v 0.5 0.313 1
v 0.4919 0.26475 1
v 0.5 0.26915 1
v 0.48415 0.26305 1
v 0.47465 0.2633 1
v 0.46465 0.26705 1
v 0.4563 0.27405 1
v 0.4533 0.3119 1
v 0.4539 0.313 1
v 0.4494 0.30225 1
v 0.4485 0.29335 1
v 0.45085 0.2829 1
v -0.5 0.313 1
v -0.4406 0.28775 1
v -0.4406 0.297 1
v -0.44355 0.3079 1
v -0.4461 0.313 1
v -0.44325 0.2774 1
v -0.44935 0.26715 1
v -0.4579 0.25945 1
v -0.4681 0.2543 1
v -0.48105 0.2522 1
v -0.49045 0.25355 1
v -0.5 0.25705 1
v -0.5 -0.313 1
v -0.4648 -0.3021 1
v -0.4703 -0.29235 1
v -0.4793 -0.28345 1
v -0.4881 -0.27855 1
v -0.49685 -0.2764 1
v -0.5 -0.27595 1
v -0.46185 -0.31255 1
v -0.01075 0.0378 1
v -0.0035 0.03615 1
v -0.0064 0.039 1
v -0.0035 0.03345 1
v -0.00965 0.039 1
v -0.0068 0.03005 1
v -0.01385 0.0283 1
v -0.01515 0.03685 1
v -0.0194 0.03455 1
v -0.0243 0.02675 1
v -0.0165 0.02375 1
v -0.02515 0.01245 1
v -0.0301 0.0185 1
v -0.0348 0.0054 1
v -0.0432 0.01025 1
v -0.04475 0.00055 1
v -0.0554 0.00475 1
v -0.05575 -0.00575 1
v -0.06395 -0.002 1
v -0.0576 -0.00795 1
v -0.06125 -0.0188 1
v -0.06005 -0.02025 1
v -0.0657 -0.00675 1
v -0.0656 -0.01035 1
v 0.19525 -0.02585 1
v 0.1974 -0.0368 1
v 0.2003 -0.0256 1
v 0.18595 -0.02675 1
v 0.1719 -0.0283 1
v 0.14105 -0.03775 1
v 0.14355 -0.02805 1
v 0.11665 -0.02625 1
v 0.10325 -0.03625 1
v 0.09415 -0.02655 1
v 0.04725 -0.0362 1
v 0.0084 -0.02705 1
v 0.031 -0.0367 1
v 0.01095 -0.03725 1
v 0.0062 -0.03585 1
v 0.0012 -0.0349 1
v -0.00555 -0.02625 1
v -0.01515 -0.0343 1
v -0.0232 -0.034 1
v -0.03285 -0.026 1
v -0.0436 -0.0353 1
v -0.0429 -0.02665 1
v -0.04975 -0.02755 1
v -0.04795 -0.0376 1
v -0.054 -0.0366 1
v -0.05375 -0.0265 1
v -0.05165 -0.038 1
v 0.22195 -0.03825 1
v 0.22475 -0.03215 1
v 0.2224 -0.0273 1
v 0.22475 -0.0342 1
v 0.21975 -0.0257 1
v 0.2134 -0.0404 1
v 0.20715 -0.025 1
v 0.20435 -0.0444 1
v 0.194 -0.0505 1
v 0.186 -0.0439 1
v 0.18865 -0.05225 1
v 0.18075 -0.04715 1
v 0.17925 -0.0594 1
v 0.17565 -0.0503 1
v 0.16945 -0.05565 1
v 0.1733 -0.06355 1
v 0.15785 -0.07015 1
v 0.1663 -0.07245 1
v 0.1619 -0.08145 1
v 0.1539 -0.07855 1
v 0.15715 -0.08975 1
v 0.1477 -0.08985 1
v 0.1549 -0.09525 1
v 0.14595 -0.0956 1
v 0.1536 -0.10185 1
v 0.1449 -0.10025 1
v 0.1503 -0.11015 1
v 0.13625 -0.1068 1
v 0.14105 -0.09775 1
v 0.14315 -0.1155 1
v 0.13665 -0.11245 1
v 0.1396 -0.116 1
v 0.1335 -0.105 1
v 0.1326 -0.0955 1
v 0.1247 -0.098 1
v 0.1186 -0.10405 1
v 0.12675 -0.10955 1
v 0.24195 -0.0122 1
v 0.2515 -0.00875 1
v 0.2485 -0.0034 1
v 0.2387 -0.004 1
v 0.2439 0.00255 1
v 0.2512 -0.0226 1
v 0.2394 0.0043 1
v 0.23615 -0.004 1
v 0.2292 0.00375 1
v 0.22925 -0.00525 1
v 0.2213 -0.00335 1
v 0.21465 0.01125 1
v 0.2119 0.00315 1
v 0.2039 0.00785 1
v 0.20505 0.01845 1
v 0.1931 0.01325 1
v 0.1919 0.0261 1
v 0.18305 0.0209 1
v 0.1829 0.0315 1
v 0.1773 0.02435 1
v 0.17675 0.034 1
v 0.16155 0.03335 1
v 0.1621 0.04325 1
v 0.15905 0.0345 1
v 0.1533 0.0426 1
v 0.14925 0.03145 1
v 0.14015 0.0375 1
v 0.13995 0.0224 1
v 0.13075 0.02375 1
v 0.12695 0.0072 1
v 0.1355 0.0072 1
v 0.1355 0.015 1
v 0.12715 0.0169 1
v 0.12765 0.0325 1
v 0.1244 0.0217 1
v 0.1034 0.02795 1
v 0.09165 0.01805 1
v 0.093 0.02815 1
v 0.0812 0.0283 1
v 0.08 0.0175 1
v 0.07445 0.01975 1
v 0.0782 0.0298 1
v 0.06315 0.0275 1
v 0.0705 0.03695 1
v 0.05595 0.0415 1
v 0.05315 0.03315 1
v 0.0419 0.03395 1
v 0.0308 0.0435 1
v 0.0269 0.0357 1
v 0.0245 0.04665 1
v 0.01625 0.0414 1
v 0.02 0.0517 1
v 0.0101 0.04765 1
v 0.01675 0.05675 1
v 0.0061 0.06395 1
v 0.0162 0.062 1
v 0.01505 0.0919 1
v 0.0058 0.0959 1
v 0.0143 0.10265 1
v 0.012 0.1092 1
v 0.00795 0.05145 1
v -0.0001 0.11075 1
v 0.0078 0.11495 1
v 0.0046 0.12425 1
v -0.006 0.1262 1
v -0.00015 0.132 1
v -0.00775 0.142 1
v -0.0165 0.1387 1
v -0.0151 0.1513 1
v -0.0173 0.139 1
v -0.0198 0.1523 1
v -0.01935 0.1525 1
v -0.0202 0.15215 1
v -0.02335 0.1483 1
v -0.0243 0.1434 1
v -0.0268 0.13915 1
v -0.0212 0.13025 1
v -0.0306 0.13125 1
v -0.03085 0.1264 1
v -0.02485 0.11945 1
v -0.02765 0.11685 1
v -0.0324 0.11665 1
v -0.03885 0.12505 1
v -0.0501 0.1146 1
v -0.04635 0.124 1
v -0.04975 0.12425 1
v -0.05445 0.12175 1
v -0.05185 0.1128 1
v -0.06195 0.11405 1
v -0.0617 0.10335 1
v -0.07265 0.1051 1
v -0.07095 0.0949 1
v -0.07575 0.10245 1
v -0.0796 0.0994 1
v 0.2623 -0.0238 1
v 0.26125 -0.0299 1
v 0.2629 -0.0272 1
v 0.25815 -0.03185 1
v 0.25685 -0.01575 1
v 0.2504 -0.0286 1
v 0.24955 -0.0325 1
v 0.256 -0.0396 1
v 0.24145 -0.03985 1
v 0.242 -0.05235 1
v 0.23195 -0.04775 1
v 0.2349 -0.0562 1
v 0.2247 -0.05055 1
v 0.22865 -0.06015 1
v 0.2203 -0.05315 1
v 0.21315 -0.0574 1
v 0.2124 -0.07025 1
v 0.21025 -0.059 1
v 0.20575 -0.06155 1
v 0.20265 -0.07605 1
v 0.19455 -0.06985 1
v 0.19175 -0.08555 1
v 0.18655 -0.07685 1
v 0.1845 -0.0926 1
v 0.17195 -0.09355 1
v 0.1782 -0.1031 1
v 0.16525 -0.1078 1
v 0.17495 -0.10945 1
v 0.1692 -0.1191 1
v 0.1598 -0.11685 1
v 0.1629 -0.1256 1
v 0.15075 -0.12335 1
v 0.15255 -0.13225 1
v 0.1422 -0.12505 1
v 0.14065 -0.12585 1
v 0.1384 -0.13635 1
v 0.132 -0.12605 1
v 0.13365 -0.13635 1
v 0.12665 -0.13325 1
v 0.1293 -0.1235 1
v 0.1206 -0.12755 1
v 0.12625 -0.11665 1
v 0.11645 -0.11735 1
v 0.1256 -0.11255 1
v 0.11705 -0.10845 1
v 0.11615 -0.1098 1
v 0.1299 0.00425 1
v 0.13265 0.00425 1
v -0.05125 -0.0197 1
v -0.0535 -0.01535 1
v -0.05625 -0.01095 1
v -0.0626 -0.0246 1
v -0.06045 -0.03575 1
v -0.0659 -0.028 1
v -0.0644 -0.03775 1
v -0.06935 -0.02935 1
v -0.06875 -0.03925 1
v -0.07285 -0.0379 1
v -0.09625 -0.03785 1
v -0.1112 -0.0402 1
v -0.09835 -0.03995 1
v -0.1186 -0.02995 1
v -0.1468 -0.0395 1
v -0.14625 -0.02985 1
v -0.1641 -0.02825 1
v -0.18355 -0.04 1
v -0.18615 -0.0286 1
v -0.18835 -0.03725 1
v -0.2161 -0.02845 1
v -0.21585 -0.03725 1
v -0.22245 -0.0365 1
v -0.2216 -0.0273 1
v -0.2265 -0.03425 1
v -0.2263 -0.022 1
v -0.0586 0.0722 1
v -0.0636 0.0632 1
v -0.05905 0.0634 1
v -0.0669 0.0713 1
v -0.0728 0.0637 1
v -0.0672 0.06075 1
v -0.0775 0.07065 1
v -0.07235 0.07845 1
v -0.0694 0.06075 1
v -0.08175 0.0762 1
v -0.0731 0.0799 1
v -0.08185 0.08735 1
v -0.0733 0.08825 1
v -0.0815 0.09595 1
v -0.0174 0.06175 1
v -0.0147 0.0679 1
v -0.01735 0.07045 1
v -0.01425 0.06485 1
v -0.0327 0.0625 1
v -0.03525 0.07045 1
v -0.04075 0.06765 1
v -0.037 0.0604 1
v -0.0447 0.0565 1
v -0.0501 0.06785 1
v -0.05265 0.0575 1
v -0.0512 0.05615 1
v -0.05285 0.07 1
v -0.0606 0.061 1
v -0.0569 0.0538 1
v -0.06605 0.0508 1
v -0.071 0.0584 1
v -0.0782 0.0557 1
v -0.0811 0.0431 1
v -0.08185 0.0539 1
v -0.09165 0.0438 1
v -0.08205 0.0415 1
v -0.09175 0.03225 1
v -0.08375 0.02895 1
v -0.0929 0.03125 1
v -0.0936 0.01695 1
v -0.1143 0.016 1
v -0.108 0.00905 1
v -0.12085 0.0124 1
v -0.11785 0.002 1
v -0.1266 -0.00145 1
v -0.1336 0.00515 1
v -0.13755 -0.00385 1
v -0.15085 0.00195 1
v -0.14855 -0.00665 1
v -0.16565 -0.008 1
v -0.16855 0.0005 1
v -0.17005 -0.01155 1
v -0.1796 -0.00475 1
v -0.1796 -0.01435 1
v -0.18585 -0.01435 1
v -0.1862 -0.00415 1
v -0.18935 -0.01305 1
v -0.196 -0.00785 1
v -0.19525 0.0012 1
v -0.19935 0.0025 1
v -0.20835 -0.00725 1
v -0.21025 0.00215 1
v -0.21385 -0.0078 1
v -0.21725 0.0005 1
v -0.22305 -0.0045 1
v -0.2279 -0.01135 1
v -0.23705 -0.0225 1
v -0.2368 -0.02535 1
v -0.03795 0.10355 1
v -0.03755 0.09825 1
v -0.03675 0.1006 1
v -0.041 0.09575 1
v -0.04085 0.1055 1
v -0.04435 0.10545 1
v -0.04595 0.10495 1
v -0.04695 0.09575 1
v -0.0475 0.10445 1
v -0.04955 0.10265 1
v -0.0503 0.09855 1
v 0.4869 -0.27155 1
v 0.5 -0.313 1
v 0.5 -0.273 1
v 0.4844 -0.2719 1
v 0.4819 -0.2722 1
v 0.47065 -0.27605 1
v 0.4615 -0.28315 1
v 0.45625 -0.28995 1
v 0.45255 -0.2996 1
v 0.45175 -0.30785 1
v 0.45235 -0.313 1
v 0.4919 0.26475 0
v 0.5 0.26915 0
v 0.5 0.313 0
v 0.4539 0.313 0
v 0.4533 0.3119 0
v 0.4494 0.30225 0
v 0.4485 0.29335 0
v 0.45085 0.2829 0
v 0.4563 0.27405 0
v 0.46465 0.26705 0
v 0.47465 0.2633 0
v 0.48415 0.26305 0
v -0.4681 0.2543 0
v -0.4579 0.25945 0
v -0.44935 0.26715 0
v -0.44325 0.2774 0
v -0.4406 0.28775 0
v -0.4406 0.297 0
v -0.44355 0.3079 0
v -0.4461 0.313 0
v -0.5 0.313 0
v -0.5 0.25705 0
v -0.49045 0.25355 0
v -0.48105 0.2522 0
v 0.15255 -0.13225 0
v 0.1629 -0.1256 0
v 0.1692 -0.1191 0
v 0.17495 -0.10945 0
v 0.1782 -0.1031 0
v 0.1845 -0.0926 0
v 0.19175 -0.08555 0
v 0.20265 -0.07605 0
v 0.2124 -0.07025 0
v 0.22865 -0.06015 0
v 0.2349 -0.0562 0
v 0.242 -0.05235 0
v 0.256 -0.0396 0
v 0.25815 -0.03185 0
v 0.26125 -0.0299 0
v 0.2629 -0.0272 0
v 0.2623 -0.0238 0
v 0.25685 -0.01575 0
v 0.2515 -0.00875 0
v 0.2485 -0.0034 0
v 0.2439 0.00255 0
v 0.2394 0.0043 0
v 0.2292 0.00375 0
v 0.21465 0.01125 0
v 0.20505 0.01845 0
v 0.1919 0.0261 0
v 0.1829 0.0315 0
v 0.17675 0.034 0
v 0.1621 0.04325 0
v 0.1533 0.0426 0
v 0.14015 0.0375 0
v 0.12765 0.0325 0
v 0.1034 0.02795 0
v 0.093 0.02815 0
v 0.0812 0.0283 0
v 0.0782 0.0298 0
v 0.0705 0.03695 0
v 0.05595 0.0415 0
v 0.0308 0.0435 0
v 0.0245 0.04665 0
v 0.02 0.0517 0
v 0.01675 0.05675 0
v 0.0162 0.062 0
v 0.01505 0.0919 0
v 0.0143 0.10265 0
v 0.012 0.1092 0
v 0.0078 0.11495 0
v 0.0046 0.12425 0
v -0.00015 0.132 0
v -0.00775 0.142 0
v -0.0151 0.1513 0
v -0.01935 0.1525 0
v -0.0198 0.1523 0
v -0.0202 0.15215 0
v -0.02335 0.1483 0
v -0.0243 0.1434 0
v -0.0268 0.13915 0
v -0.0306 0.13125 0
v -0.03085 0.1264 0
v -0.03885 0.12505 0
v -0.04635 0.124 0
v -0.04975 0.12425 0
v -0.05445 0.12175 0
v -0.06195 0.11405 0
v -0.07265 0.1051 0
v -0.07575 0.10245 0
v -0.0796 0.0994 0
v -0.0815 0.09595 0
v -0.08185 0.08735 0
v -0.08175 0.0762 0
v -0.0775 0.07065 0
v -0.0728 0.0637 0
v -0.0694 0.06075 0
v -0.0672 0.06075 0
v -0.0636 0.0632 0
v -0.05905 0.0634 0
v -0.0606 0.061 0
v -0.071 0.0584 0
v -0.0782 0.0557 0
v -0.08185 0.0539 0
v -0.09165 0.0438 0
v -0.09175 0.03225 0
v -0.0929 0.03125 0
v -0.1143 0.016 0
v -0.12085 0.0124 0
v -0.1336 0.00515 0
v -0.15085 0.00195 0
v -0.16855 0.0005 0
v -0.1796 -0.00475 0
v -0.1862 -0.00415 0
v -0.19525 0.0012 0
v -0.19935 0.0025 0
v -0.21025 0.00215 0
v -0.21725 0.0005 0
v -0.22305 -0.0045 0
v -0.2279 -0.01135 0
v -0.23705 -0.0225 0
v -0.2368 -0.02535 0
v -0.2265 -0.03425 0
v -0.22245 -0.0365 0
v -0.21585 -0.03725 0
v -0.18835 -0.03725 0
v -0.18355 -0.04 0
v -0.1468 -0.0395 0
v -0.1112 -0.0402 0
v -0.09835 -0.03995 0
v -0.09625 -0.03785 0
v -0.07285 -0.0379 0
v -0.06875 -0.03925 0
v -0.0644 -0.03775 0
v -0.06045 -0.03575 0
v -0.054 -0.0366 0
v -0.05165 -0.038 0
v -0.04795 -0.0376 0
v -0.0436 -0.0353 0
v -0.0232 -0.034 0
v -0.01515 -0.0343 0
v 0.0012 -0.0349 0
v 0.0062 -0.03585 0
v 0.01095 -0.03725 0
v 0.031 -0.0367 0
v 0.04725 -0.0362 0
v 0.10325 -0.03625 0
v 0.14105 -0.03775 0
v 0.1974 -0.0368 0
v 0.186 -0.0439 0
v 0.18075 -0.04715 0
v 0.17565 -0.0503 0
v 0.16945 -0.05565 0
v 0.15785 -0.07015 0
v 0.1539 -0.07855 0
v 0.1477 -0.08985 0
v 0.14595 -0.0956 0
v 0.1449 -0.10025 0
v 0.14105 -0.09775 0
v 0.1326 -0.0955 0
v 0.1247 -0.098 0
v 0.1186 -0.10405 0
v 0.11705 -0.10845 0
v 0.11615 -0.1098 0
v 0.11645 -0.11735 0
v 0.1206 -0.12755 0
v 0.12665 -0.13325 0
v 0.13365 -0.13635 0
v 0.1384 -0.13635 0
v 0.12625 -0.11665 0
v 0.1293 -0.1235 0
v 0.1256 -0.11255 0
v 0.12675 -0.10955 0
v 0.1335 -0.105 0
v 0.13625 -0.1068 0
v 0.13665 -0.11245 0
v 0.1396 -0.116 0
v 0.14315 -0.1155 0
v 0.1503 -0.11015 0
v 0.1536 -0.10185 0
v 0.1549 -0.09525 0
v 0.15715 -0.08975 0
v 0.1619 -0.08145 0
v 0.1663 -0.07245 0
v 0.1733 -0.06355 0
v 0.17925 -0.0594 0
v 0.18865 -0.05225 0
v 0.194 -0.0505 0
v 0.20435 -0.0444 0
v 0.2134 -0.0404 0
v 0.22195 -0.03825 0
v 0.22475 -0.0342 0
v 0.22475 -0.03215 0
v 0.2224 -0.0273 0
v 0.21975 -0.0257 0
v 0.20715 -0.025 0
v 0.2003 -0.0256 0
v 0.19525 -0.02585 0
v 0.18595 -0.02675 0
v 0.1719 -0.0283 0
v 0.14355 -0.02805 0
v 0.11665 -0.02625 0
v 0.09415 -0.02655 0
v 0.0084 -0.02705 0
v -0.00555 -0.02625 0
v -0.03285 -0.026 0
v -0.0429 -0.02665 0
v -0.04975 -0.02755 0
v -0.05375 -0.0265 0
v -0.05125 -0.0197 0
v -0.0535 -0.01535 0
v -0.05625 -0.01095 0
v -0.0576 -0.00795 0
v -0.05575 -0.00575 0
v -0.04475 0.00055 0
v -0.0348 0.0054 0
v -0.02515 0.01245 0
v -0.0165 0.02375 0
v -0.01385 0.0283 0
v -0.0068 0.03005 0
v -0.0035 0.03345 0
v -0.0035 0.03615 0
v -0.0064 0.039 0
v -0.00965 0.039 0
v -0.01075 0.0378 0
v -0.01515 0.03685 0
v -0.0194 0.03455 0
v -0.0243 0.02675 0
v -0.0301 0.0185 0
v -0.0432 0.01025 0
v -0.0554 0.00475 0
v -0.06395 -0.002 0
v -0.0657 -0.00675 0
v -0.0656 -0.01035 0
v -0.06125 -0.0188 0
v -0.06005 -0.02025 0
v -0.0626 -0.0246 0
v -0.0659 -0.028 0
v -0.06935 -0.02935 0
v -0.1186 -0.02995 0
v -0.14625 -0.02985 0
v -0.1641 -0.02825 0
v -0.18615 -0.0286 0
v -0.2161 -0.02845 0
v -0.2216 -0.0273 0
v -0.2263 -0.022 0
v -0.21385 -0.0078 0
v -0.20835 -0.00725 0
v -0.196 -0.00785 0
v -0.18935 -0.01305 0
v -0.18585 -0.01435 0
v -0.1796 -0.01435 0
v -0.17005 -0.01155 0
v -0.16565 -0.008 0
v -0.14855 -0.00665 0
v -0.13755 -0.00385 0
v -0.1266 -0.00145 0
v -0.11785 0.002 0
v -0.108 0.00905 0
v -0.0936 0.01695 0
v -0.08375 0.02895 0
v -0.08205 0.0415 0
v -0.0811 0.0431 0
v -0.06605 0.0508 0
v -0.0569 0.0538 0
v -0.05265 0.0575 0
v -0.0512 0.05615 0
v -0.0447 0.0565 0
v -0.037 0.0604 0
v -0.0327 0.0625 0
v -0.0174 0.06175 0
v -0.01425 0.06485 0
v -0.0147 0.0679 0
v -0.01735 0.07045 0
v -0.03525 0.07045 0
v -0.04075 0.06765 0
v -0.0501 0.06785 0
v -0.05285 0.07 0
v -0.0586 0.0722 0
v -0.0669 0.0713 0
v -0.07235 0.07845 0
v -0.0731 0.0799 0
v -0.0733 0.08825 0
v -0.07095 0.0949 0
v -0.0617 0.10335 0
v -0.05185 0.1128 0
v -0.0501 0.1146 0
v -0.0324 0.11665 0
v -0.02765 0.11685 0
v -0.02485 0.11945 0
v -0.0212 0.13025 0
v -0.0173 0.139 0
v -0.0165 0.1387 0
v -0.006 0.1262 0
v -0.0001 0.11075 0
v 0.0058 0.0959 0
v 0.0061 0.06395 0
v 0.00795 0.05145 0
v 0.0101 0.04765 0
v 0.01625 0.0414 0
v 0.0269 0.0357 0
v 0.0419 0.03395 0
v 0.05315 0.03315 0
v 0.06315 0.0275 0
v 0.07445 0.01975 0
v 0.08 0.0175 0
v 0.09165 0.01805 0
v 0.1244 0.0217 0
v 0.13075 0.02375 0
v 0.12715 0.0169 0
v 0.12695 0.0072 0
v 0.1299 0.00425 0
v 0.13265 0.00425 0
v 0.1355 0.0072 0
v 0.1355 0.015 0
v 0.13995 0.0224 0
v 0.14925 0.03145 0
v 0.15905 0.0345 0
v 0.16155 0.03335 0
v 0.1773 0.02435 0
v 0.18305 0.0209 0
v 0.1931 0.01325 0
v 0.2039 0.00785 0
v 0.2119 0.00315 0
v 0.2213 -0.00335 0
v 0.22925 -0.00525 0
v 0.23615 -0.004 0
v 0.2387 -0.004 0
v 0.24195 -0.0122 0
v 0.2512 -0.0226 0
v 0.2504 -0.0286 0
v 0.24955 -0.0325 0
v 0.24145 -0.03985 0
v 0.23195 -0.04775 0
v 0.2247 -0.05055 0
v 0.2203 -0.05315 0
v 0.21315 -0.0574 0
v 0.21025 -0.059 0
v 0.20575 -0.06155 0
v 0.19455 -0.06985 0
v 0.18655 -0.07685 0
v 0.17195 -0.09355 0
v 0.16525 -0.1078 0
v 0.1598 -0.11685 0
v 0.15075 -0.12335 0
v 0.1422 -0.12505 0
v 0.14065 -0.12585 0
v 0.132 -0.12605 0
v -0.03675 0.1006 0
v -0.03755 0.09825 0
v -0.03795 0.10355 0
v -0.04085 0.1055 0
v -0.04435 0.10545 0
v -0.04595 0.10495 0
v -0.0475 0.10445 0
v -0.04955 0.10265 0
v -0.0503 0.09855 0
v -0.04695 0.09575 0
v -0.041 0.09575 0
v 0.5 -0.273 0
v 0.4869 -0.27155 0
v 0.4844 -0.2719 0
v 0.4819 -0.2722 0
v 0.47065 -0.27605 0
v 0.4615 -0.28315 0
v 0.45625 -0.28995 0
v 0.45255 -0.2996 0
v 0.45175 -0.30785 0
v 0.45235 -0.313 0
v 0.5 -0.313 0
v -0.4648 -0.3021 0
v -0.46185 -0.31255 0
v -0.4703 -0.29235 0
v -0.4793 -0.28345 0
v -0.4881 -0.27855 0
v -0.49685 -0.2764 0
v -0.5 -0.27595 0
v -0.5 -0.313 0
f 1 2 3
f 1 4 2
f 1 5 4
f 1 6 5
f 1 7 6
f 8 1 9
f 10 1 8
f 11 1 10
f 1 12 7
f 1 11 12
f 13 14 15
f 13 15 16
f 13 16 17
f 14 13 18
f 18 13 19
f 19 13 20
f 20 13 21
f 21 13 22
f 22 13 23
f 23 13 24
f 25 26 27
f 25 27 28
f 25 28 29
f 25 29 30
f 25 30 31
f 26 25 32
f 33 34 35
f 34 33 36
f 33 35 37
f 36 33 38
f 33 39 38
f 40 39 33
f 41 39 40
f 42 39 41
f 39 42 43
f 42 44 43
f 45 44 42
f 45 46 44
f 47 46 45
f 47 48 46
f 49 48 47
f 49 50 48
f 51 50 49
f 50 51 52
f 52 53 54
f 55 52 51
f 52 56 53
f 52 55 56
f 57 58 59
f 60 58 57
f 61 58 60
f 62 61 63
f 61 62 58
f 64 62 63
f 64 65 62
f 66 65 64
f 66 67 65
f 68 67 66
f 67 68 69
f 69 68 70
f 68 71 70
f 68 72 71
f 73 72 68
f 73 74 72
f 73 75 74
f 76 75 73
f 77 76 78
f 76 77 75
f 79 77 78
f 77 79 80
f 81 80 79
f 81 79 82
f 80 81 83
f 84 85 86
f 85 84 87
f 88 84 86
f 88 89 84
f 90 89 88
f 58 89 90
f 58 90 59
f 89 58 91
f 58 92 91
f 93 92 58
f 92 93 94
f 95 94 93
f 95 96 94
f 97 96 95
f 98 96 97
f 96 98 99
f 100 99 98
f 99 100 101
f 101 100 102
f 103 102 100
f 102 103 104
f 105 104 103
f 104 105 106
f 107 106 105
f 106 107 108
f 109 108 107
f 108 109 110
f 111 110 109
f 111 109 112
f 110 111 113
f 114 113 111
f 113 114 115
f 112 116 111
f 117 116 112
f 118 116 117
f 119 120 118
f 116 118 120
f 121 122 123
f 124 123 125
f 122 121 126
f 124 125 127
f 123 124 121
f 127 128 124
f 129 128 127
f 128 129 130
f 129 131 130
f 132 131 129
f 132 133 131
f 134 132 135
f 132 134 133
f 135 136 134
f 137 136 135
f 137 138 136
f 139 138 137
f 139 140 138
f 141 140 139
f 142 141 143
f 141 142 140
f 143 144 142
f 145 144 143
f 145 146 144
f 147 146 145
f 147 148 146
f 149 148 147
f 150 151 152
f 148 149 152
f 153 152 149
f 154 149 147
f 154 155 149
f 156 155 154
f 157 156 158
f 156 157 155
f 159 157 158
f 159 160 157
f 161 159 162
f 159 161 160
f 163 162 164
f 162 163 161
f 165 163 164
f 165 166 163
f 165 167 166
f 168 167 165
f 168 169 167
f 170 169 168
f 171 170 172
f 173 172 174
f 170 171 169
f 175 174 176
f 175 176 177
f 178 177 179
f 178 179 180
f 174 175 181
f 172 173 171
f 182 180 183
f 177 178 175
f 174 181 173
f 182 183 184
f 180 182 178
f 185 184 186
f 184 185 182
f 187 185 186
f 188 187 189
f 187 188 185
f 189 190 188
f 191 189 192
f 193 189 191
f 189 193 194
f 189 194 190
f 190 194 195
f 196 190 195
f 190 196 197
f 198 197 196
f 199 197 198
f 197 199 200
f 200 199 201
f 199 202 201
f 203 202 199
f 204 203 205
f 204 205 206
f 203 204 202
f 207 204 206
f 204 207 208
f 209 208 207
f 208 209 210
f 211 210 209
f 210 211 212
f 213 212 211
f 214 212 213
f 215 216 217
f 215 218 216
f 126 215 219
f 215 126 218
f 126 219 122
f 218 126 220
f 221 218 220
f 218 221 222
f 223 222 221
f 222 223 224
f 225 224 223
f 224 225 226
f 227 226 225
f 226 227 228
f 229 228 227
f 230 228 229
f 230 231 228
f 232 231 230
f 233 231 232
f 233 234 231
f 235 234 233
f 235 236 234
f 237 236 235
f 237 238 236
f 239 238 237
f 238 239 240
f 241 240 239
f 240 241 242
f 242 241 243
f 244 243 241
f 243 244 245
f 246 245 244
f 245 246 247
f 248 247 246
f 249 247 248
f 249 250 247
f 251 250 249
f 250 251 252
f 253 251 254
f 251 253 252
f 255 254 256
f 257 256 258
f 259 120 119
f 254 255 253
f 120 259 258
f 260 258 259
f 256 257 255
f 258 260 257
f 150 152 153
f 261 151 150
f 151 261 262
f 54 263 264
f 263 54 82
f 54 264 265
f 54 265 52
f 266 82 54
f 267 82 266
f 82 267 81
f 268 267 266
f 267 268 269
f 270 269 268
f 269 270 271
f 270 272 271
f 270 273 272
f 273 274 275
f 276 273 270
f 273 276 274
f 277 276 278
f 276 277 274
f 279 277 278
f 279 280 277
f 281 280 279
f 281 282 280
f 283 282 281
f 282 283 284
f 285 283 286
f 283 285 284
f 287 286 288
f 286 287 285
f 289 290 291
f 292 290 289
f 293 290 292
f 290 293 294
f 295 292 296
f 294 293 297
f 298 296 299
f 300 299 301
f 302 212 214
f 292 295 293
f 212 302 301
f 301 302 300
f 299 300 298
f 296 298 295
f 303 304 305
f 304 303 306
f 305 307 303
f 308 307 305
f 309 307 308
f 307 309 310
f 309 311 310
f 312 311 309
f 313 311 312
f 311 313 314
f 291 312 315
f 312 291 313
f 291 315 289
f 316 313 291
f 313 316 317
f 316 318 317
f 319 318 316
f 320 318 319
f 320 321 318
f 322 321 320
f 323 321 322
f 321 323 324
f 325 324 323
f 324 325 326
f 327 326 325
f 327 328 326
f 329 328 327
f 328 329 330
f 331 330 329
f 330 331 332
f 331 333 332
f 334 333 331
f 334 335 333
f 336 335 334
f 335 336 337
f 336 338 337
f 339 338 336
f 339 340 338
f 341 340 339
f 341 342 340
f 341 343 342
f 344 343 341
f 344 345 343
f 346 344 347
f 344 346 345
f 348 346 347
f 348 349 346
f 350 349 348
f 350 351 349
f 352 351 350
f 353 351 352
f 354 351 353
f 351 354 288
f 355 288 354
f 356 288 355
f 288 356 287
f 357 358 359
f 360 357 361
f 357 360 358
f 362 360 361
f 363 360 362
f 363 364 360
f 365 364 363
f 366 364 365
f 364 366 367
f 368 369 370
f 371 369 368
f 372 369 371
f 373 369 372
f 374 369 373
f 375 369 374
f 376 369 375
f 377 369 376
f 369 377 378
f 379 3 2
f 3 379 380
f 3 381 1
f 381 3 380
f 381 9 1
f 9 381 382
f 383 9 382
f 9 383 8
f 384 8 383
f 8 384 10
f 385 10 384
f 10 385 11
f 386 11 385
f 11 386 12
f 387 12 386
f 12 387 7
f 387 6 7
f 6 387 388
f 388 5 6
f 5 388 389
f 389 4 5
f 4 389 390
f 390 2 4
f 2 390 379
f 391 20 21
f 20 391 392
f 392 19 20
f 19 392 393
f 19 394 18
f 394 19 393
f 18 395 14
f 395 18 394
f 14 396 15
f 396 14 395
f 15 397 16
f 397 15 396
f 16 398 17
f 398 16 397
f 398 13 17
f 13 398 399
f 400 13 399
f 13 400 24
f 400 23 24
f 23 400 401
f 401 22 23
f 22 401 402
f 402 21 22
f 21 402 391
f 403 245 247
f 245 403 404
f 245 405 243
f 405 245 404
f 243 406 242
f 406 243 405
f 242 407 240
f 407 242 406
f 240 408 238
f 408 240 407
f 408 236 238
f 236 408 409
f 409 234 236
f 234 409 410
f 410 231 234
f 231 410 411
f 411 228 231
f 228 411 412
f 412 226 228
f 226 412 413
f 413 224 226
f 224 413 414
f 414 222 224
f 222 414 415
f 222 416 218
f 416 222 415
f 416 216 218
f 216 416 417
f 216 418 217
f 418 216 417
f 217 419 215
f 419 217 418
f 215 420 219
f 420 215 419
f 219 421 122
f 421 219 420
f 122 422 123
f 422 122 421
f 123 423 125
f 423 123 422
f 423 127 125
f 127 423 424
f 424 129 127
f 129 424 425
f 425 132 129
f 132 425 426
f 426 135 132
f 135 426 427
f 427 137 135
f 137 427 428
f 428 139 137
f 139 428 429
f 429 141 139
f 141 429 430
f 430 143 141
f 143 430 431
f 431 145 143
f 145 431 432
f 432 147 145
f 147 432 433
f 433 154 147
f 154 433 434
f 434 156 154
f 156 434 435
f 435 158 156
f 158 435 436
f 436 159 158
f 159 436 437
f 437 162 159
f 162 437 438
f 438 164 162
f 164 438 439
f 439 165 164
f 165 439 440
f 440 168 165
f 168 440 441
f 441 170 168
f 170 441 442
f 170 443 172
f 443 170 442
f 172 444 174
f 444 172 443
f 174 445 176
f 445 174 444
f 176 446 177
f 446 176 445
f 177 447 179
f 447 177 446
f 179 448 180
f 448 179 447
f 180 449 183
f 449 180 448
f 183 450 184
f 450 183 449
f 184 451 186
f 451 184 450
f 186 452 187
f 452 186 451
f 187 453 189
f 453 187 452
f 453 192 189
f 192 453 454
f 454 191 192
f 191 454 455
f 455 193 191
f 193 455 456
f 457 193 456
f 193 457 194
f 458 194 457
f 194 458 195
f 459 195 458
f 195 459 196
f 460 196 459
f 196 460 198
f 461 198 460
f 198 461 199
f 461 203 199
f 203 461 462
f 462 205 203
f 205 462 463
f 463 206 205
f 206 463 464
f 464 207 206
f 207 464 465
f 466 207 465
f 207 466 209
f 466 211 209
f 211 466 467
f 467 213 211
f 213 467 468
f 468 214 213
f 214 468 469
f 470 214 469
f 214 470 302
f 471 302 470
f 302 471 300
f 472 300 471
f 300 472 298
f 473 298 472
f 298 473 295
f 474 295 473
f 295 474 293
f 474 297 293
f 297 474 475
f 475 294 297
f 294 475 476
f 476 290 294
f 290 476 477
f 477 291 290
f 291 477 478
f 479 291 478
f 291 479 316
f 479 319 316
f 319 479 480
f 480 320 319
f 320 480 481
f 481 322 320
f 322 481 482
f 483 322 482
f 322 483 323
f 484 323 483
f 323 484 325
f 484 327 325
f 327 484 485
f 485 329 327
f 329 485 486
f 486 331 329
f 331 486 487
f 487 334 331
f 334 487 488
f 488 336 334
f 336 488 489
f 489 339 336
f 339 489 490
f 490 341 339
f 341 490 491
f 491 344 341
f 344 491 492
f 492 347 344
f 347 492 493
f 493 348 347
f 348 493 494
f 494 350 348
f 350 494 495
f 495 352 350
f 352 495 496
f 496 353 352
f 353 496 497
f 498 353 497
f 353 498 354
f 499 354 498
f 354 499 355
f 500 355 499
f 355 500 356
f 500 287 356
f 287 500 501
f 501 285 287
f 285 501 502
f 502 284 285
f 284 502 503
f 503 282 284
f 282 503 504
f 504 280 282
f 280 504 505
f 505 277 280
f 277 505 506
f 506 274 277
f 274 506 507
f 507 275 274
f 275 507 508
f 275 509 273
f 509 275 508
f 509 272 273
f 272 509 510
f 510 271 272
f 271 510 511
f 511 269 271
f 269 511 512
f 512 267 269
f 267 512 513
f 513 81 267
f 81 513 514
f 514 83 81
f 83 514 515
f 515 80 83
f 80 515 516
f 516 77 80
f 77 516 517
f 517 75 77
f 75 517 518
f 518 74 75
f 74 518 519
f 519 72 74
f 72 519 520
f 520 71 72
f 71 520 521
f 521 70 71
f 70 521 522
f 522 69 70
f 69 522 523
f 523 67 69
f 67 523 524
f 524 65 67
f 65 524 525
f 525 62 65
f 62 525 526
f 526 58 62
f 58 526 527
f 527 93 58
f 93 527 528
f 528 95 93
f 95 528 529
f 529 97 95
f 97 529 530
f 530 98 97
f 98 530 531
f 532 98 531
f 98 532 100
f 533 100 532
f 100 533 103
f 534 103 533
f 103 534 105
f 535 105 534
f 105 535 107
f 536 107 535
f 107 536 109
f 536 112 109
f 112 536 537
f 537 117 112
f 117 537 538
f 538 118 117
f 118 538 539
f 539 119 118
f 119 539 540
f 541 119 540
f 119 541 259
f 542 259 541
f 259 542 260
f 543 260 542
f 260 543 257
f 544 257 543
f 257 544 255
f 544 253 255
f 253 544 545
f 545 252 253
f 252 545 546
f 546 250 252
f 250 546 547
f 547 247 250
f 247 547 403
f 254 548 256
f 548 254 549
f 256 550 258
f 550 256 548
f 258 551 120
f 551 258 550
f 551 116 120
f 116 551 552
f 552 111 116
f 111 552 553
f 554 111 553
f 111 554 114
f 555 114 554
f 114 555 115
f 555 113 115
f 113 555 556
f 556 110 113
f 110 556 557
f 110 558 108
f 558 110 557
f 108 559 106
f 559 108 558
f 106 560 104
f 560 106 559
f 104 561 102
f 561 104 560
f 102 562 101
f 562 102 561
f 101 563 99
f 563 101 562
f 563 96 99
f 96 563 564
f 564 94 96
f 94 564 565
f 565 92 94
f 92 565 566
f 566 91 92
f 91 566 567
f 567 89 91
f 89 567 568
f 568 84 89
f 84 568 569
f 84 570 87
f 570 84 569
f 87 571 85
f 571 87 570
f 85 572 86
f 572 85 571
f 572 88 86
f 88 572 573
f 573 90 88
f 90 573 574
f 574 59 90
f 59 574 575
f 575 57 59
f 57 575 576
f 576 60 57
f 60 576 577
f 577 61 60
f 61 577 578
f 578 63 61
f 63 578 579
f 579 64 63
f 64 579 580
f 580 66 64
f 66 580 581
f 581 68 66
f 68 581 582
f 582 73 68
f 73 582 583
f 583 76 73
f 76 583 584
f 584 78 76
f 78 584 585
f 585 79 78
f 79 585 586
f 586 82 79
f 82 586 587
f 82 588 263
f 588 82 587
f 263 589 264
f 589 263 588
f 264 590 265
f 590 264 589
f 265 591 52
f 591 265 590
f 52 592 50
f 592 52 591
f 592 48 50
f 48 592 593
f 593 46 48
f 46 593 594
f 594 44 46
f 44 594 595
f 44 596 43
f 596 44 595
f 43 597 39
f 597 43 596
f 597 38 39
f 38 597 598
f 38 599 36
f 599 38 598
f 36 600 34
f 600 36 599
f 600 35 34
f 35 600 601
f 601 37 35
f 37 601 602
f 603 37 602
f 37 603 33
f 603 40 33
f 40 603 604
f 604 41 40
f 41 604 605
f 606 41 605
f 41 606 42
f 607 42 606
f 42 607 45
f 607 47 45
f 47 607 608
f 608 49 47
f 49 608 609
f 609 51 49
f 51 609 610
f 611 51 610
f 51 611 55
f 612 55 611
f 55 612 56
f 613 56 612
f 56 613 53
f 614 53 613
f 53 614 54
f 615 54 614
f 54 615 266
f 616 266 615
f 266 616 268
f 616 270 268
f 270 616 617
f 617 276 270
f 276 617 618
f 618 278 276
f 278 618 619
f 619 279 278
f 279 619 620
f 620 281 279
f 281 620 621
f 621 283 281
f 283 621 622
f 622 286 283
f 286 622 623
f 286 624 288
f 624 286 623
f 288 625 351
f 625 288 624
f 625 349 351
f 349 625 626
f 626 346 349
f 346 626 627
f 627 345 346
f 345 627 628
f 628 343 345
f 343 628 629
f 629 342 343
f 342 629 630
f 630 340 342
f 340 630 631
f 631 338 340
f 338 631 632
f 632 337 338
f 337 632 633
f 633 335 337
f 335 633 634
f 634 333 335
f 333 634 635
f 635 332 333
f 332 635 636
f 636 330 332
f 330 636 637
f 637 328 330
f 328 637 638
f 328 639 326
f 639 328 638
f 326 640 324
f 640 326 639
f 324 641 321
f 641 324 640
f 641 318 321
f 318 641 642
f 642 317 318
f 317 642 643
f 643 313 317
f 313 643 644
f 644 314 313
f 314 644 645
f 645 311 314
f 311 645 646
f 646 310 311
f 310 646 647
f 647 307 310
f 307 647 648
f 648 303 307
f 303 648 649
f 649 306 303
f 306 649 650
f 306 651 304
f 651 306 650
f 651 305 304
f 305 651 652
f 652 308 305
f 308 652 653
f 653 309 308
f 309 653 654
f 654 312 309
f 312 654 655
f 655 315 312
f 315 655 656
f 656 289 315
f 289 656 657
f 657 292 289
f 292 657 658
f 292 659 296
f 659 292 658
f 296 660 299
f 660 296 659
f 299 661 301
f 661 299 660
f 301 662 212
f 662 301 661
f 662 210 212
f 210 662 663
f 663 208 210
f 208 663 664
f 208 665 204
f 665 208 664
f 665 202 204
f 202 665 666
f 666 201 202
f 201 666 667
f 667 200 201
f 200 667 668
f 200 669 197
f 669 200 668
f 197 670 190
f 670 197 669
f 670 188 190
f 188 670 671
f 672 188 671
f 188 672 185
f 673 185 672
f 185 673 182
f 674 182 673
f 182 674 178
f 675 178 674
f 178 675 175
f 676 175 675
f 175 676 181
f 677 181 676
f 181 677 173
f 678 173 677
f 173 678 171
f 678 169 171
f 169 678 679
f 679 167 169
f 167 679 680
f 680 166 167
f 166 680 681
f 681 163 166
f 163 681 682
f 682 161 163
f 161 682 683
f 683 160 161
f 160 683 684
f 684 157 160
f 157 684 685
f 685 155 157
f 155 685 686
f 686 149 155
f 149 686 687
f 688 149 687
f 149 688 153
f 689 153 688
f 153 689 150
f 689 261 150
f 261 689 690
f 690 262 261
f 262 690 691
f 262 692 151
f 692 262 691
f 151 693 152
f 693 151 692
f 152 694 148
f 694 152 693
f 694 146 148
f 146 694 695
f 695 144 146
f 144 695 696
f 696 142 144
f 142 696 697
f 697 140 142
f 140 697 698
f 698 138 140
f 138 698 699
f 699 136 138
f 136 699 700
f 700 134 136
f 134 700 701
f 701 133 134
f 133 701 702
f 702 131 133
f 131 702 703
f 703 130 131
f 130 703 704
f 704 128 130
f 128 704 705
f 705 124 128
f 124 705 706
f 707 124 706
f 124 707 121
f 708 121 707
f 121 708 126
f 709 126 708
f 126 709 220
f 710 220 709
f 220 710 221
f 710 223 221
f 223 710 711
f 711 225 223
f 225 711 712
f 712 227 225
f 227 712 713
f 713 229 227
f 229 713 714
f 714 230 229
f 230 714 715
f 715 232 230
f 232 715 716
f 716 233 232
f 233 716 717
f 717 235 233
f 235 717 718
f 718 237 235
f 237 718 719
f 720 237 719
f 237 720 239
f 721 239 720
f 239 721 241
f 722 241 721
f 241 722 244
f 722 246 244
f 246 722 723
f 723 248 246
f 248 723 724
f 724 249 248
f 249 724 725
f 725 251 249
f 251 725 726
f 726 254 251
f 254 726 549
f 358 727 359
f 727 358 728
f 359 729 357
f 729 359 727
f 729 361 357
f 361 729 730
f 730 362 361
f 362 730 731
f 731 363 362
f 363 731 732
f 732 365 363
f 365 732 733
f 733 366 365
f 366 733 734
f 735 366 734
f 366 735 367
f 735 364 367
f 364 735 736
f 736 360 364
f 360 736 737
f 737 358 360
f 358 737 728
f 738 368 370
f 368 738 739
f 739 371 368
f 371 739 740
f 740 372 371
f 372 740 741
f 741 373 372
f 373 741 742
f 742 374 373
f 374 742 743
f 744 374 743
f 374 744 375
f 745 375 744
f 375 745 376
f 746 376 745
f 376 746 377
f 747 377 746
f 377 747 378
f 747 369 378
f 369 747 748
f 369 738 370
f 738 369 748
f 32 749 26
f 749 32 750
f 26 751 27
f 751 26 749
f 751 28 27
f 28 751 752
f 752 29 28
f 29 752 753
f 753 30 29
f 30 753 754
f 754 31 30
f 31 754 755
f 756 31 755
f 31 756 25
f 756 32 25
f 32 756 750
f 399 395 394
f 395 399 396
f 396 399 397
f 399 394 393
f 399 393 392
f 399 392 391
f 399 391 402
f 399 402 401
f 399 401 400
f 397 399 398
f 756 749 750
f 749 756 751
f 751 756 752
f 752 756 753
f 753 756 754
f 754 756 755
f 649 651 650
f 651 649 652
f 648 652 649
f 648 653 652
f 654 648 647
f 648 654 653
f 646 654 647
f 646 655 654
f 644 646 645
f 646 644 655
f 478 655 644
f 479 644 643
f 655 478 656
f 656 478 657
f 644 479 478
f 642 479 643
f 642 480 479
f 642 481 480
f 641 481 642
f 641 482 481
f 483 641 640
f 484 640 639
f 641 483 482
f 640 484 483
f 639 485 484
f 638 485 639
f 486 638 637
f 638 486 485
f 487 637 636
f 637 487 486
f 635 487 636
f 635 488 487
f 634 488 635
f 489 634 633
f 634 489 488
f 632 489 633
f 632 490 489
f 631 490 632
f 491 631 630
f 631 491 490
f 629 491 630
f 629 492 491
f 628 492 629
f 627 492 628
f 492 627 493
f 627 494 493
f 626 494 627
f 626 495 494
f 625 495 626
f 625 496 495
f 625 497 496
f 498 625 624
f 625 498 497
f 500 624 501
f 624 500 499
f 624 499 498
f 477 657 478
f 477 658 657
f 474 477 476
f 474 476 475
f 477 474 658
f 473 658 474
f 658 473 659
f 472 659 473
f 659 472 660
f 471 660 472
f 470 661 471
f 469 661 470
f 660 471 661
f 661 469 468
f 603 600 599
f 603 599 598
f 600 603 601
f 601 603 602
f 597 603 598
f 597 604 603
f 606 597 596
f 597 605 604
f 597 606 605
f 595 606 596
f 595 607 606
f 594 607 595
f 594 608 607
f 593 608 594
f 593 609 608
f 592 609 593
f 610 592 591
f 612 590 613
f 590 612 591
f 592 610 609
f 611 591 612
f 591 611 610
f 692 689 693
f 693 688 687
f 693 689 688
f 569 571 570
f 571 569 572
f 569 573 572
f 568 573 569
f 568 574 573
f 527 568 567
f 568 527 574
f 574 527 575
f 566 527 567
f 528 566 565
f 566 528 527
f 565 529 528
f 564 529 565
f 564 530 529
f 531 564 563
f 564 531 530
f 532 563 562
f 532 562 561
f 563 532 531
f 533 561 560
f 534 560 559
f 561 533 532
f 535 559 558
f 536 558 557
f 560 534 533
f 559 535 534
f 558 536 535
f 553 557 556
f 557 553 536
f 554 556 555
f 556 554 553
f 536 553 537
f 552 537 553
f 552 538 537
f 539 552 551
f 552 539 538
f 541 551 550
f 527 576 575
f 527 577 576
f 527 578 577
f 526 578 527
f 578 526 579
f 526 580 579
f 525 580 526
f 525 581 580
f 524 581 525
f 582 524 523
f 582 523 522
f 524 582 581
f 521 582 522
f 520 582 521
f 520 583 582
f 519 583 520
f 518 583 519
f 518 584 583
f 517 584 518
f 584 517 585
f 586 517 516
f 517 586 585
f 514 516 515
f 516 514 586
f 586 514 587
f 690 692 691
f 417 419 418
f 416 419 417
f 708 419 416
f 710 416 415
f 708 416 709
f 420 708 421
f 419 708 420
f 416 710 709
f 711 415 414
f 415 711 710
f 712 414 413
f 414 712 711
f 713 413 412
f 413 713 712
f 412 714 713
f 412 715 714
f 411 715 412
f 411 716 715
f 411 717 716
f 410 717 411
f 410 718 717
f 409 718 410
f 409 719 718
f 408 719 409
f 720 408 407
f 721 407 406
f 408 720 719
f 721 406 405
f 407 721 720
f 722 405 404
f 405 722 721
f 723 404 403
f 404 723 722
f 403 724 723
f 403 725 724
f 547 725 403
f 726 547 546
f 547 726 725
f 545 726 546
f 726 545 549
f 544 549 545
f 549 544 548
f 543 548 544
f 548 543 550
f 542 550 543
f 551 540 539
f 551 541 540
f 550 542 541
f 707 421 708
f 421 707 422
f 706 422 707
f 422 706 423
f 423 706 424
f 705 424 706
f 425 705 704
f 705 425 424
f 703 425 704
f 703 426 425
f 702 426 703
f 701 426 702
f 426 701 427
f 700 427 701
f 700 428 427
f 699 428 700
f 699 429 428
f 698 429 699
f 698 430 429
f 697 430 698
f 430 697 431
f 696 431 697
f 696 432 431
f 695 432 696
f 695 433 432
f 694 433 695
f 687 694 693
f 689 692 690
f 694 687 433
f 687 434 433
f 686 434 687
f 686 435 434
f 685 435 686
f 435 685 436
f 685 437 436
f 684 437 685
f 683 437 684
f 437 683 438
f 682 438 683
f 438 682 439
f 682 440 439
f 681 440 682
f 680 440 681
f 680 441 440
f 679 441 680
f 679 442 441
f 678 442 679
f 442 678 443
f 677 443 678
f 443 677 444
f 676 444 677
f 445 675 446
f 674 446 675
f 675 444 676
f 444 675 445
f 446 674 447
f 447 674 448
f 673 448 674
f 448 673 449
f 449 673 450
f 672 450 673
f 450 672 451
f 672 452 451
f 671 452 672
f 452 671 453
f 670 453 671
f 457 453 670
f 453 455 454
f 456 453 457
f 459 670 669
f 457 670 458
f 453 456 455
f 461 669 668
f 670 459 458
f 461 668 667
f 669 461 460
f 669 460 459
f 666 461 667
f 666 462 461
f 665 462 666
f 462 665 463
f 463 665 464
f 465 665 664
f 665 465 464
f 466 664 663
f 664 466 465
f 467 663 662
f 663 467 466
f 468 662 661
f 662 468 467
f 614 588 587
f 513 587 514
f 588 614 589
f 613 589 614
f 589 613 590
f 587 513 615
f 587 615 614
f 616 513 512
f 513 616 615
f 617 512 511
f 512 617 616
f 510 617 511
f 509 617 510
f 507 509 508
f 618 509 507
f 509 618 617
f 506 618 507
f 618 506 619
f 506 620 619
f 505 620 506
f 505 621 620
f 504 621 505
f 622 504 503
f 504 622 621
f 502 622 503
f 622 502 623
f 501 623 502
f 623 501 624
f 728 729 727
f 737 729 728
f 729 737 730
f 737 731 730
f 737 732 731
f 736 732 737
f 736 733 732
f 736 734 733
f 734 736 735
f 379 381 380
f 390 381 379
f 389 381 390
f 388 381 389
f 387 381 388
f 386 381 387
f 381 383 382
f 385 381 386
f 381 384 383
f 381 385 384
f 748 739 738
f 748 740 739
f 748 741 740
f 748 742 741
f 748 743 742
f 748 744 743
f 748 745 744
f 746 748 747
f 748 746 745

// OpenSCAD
module fan9yellow_1()
{
 /* Generated by trace2scad version 20150415
    http://aggregate.org/MAKE/TRACE2SCAD/
    Optimized model has 382/1871 original points
 */
  minx=0; /* polygon minx=0 */
  miny=0; /* polygon miny=0 */
  maxx=20000; /* polygon maxx=20000 */
  maxy=12520; /* polygon maxy=12520 */
  dx=maxx-minx;
  dy=maxy-miny;
  maxd=((dx>dy)?dx:dy);
 scale([1/maxd, 1/maxd, 1])
 translate([-minx-dx/2, -miny-dy/2, 0])
 linear_extrude(height=1, convexity=382)
 union() {
  union() {
   polygon([[0,11961],[0,11401],[191,11331],[379,11304],[638,11346],[842,11449],[1013,11603],[1135,11808],[1188,12015],[1188,12200],[1129,12418],[1078,12520],[0,12520]], convexity=5);
   polygon([[19072,12509],[19066,12498],[18988,12305],[18970,12127],[19017,11918],[19126,11741],[19293,11601],[19493,11526],[19683,11521],[19838,11555],[20000,11643],[20000,12520],[19078,12520]], convexity=6);
   union() {
    difference() {
     polygon([[9604,9306],[9596,9303],[9533,9226],[9514,9128],[9464,9043],[9388,8885],[9383,8788],[9223,8761],[9073,8740],[9005,8745],[8911,8695],[8761,8541],[8547,8362],[8485,8309],[8408,8248],[8370,8179],[8363,8007],[8365,7784],[8450,7673],[8544,7534],[8612,7475],[8656,7475],[8728,7524],[8819,7528],[8788,7480],[8580,7428],[8436,7374],[8363,7338],[8167,7136],[8165,6905],[8142,6885],[7714,6580],[7583,6508],[7328,6363],[6983,6299],[6629,6270],[6408,6165],[6276,6177],[6095,6284],[6013,6310],[5795,6303],[5655,6270],[5539,6170],[5442,6033],[5259,5810],[5264,5753],[5470,5575],[5551,5530],[5683,5515],[6233,5515],[6329,5460],[7064,5470],[7776,5456],[8033,5461],[8075,5503],[8543,5502],[8625,5475],[8712,5505],[8791,5545],[8920,5528],[8967,5500],[9041,5508],[9128,5554],[9536,5580],[9697,5574],[10024,5562],[10124,5543],[10219,5515],[10620,5526],[10945,5536],[12065,5535],[12821,5505],[13948,5524],[13720,5382],[13615,5317],[13513,5254],[13389,5147],[13157,4857],[13078,4689],[12954,4463],[12919,4348],[12898,4255],[12821,4305],[12652,4350],[12494,4300],[12372,4179],[12341,4091],[12323,4064],[12329,3913],[12412,3709],[12533,3595],[12673,3533],[12768,3533],[13051,3615],[13258,3748],[13384,3878],[13499,4071],[13564,4198],[13690,4408],[13835,4549],[14053,4739],[14248,4855],[14573,5057],[14698,5136],[14840,5213],[15120,5468],[15163,5623],[15225,5662],[15258,5716],[15246,5784],[15137,5945],[15030,6085],[14970,6192],[14878,6311],[14788,6346],[14584,6335],[14293,6485],[14101,6629],[13838,6782],[13658,6890],[13535,6940],[13242,7125],[13066,7112],[12803,7010],[12553,6910],[12068,6819],[11860,6823],[11624,6826],[11564,6856],[11410,6999],[11119,7090],[10616,7130],[10490,7193],[10400,7294],[10335,7395],[10324,7500],[10301,8098],[10286,8313],[10240,8444],[10156,8559],[10092,8745],[9997,8900],[9845,9100],[9698,9286],[9613,9310]], convexity=34);
     polygon([[9662,9037],[9670,9034],[9880,8784],[9998,8475],[10116,8178],[10122,7539],[10159,7289],[10202,7213],[10325,7088],[10538,6974],[10838,6939],[11063,6923],[11263,6810],[11489,6655],[11600,6610],[11833,6621],[12488,6694],[12615,6735],[12543,6598],[12539,6404],[12598,6345],[12653,6345],[12710,6404],[12710,6560],[12799,6708],[12985,6889],[13181,6950],[13231,6927],[13546,6747],[13661,6678],[13862,6525],[14078,6417],[14238,6323],[14426,6193],[14585,6155],[14723,6180],[14774,6180],[14839,6016],[15024,5808],[15008,5688],[14991,5610],[14829,5463],[14639,5305],[14494,5249],[14406,5197],[14263,5112],[14205,5080],[14115,5029],[13891,4863],[13731,4723],[13439,4389],[13305,4104],[13196,3923],[13015,3793],[12844,3759],[12813,3743],[12640,3739],[12586,3790],[12525,3927],[12512,4009],[12535,4069],[12670,4160],[12725,4124],[12733,4011],[12792,3940],[12863,3950],[13006,4057],[13072,4223],[13098,4355],[13143,4465],[13238,4631],[13326,4811],[13466,4989],[13585,5072],[13773,5215],[13880,5250],[14087,5372],[14268,5452],[14439,5495],[14495,5576],[14495,5617],[14448,5714],[14395,5746],[14143,5760],[14006,5748],[13905,5743],[13719,5725],[13438,5694],[12871,5699],[12333,5735],[11883,5729],[10168,5719],[9889,5735],[9343,5740],[9142,5727],[9005,5709],[8925,5730],[8975,5866],[8930,5953],[8875,6041],[8848,6101],[8885,6145],[9105,6271],[9304,6368],[9497,6509],[9670,6735],[9723,6826],[9864,6861],[9930,6929],[9930,6983],[9872,7040],[9807,7040],[9785,7016],[9697,6997],[9612,6951],[9514,6795],[9398,6630],[9136,6465],[8892,6355],[8721,6220],[8686,6125],[8688,6053],[8775,5884],[8799,5855],[8748,5768],[8682,5700],[8613,5673],[7628,5661],[7075,5663],[6718,5695],[6277,5688],[5678,5691],[5568,5714],[5474,5820],[5723,6104],[5833,6115],[6080,6103],[6213,5999],[6283,5973],[6408,5973],[6599,6029],[6687,6100],[7029,6127],[7249,6183],[7468,6231],[7643,6300],[7840,6441],[8128,6599],[8325,6839],[8359,7090],[8378,7122],[8679,7276],[8862,7336],[8947,7410],[8976,7383],[9106,7390],[9260,7468],[9346,7510],[9652,7495],[9715,7557],[9706,7618],[9653,7669],[9295,7669],[9185,7613],[8998,7617],[8943,7660],[8828,7704],[8662,7686],[8553,7829],[8538,7858],[8534,8025],[8581,8158],[8766,8327],[8963,8516],[8998,8552],[9352,8593],[9447,8597],[9503,8649],[9576,8865],[9654,9040]], convexity=45);
    }
    polygon([[9081,8359],[9050,8349],[9009,8313],[8994,8231],[9061,8175],[9180,8175],[9249,8225],[9265,8272],[9241,8331],[9183,8370],[9113,8369]], convexity=7);
   }
   polygon([[19688,822],[19638,816],[19413,739],[19230,597],[19125,461],[19051,268],[19035,103],[19047,0],[20000,0],[20000,800],[19738,829]], convexity=6);
   polygon([[0,371],[0,0],[763,9],[704,218],[594,413],[414,591],[238,689],[63,732],[0,741]], convexity=5);
  }
 }
}

module fan9yellow()
{
 /* all layers combined, scaled to within a 1mm cube */
 scale([1, 1, 1/1])
 difference() {
  union() {
   scale([1,1,2]) translate([0,0,-0.5]) fan9yellow_1();
  }
  translate([0,0,-2]) cube([2,2,4],center=true);
 }
}
fan9yellow();
